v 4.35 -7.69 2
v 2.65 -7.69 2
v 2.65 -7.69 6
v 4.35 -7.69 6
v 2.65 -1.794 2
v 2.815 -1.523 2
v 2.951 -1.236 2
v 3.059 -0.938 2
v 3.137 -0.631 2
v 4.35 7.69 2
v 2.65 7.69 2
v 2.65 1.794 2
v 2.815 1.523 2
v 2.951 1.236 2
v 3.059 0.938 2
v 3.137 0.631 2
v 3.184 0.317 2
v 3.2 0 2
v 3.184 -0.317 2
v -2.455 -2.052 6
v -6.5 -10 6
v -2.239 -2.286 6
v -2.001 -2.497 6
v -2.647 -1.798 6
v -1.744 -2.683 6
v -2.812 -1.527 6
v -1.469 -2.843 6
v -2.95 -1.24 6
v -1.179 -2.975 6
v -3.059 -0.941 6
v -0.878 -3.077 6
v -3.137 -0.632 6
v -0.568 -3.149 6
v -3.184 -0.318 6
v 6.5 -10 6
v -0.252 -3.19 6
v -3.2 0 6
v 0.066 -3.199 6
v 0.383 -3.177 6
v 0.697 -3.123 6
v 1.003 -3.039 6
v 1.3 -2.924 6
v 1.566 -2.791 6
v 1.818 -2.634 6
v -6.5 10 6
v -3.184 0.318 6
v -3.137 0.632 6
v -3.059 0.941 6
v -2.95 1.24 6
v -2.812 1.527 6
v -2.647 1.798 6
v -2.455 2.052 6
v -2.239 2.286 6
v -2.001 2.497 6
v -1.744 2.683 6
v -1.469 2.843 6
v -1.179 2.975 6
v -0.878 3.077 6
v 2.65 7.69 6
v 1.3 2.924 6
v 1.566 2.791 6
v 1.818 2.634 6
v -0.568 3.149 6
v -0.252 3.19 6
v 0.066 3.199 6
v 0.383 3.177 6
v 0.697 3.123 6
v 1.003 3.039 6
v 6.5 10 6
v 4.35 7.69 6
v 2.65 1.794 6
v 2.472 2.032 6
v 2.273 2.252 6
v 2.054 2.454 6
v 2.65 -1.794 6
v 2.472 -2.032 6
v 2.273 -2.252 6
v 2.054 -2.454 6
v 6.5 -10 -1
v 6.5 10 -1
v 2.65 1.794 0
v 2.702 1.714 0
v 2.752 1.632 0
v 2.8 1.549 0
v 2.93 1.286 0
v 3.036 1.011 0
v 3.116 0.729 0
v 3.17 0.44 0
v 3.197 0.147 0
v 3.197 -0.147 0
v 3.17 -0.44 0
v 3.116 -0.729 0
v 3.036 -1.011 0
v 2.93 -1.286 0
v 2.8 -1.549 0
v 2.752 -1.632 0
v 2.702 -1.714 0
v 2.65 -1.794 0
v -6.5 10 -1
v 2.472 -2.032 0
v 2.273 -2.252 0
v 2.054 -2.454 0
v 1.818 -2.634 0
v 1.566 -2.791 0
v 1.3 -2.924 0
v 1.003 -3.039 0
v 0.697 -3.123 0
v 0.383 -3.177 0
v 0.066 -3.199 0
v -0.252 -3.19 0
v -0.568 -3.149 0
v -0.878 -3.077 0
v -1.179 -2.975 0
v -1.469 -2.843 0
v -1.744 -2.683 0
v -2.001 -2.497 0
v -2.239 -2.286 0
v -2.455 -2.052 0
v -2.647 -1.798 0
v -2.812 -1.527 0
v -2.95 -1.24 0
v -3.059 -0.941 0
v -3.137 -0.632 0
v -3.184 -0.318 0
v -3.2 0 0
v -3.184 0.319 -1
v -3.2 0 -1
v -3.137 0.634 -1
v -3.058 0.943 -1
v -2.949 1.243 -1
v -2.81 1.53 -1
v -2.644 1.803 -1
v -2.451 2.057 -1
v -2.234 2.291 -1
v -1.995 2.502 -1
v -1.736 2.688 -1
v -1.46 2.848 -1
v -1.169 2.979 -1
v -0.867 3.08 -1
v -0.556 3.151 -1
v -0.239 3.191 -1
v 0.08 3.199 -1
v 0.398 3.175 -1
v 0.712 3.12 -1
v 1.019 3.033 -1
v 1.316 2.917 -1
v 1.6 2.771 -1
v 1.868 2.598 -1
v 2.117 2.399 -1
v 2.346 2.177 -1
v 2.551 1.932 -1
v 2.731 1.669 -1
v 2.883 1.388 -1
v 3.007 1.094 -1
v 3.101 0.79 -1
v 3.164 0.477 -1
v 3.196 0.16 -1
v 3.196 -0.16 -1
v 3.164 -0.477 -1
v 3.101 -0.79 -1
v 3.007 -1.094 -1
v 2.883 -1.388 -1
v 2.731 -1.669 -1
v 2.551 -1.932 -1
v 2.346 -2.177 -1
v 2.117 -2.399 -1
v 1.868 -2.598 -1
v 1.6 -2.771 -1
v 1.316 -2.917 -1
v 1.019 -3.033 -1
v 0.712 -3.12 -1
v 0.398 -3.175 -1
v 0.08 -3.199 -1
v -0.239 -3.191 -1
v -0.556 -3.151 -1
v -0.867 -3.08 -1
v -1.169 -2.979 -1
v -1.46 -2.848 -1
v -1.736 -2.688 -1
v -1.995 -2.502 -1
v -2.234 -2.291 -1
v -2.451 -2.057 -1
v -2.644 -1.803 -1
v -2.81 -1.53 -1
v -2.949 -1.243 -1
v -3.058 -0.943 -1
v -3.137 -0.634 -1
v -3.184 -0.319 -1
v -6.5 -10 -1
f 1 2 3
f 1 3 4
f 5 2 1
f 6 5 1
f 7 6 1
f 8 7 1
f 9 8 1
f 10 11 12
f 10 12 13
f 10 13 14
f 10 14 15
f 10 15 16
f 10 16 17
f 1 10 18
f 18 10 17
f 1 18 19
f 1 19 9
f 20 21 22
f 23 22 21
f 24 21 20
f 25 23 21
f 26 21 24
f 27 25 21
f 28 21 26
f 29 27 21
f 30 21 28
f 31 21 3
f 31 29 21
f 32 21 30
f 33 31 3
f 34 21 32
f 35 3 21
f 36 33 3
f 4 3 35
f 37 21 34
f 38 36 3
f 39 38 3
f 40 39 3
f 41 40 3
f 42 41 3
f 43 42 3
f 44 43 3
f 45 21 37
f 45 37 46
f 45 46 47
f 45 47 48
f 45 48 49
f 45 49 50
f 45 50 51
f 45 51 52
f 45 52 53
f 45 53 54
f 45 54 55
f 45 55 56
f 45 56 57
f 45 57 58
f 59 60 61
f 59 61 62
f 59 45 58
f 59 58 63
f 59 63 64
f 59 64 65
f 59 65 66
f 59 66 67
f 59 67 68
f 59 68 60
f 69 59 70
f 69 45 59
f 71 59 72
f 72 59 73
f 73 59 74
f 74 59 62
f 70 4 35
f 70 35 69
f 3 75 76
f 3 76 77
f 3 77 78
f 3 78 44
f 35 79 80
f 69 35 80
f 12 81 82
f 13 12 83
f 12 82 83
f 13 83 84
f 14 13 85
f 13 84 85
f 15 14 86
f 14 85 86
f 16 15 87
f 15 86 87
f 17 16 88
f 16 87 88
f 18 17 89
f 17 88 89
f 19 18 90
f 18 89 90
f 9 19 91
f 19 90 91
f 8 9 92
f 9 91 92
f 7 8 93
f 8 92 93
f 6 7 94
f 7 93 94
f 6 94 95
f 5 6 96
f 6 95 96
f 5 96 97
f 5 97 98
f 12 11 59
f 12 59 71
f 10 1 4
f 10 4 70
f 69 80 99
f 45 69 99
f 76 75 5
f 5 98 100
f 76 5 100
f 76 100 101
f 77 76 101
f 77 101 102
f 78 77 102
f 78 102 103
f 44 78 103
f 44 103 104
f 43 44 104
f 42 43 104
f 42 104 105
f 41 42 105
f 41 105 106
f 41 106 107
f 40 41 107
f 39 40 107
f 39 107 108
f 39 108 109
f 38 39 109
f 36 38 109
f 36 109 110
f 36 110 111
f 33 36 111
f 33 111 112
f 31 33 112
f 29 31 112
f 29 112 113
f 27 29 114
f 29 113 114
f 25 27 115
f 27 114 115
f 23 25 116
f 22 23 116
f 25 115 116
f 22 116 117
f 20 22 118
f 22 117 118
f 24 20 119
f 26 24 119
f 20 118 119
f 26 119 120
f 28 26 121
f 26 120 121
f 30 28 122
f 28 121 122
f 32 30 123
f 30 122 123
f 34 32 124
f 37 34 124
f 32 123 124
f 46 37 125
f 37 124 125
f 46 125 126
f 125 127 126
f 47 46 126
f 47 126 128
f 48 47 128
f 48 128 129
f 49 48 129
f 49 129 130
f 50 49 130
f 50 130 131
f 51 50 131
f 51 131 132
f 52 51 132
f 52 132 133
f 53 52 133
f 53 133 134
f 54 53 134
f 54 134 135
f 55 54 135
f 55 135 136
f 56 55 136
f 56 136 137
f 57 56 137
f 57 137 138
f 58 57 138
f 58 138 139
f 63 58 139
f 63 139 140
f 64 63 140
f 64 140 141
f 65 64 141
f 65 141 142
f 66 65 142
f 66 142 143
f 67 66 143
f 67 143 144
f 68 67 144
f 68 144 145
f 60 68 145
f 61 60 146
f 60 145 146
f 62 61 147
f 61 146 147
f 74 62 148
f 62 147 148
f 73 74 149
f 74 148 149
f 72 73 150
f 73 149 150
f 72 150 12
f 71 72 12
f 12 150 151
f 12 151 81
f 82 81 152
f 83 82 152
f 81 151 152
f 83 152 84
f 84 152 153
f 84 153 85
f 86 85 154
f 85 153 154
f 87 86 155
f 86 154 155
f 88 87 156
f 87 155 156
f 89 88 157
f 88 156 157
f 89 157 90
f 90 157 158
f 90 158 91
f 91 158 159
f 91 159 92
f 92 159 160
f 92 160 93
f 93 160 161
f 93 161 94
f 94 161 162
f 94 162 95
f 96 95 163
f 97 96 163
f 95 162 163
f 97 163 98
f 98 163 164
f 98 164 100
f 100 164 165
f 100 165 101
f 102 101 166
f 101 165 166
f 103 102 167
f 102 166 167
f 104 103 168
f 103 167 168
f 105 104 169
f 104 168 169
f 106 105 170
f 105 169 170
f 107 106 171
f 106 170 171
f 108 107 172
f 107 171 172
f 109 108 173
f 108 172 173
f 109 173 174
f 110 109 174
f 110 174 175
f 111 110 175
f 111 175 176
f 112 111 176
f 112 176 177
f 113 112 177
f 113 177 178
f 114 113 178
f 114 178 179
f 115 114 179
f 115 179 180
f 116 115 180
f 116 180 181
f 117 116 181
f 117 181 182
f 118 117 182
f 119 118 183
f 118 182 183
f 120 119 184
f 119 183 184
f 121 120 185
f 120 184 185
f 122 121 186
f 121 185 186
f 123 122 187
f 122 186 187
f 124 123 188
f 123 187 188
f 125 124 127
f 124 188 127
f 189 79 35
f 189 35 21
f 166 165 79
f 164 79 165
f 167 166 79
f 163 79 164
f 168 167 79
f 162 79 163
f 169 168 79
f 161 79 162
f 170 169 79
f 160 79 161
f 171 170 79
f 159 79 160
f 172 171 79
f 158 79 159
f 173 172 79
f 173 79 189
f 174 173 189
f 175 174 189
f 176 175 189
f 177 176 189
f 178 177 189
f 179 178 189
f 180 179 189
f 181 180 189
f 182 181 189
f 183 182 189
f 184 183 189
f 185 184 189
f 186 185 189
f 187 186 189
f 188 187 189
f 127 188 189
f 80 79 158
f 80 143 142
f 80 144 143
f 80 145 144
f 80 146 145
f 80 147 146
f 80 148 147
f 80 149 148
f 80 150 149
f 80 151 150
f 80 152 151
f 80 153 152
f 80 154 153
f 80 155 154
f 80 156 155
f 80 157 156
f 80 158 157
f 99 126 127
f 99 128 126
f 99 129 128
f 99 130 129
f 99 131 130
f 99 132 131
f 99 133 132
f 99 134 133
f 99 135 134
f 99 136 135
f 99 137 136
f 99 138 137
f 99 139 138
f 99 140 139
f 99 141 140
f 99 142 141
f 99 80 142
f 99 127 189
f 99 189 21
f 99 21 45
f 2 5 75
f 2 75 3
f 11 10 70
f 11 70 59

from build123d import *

# Parameters (mm, degrees)
SKETCH2_W           = 13
SKETCH2_H           = 20
BOSS_EXTRUDE1_DEPTH = 6
BOSS_EXTRUDE2_DEPTH = 2
BOSS_EXTRUDE3_START = 1
SKETCH3_W           = 13
SKETCH3_H           = 20
SKETCH3_R           = 3.2
BOSS_EXTRUDE3_DEPTH = 1
BOSS_EXTRUDE4_DEPTH = 4
CUT_EXTRUDE1_START  = -6
CUT_EXTRUDE1_DEPTH  = 6
BOSS_EXTRUDE5_DEPTH = 2


# Read off the part's stored shape, not the designer's step: Cut-Extrude1
with BuildPart() as part:
    # Sketch2 → Boss-Extrude1 (new body)
    with BuildSketch(Plane.XY):
        Rectangle(SKETCH2_W, SKETCH2_H)
        with BuildLine():
            Line((1.3, -9.04), (1.3, -2.924038303))
            ThreePointArc((1.3, -2.924038303), (-3.2, 0), (1.3, 2.924038303))
            Line((1.3, 2.924038303), (1.3, 9.04))
            Line((1.3, 9.04), (5.7, 9.04))
            Line((5.7, 9.04), (5.7, -9.04))
            Line((5.7, -9.04), (1.3, -9.04))
        make_face(mode=Mode.SUBTRACT)
    extrude(amount=BOSS_EXTRUDE1_DEPTH)

    # Sketch2<3> → Boss-Extrude2 (add)
    with BuildSketch(Plane.XY):
        with BuildLine():
            Line((4.2, 7.54), (4.2, -7.54))
            Line((4.2, -7.54), (2.8, -7.54))
            Line((2.8, -7.54), (2.8, -1.549193338))
            ThreePointArc((2.8, -1.549193338), (2.162186317, -2.359014695), (1.3, -2.924038303))
            Line((1.3, -2.924038303), (1.3, -9.04))
            Line((1.3, -9.04), (5.7, -9.04))
            Line((5.7, -9.04), (5.7, 9.04))
            Line((5.7, 9.04), (1.3, 9.04))
            Line((1.3, 9.04), (1.3, 2.924038303))
            ThreePointArc((1.3, 2.924038303), (2.162186317, 2.359014695), (2.8, 1.549193338))
            Line((2.8, 1.549193338), (2.8, 7.54))
            Line((2.8, 7.54), (4.2, 7.54))
        make_face()
    extrude(amount=BOSS_EXTRUDE2_DEPTH)

    # Sketch3 → Boss-Extrude3 (add)
    with BuildSketch(Plane(origin=(0, 0, 0), x_dir=(-1, 0, 0), z_dir=(0, 0, -1)).offset(BOSS_EXTRUDE3_START)):
        Rectangle(SKETCH3_W, SKETCH3_H)
        Circle(SKETCH3_R, mode=Mode.SUBTRACT)
    extrude(amount=-BOSS_EXTRUDE3_DEPTH)

    # Sketch4 → Boss-Extrude4 (add)
    with BuildSketch(Plane.XY.offset(2)):
        with BuildLine():
            Line((2.8, 1.549193338), (2.8, 7.54))
            Line((2.8, 7.54), (4.2, 7.54))
            Line((4.2, 7.54), (4.2, -7.54))
            Line((4.2, -7.54), (2.8, -7.54))
            Line((2.8, -7.54), (2.8, -1.549193338))
            ThreePointArc((2.8, -1.549193338), (2.162186317, -2.359014695), (1.3, -2.924038303))
            Line((1.3, -2.924038303), (1.3, -9.04))
            Line((1.3, -9.04), (5.7, -9.04))
            Line((5.7, -9.04), (5.7, 9.04))
            Line((5.7, 9.04), (1.3, 9.04))
            Line((1.3, 9.04), (1.3, 2.924038303))
            ThreePointArc((1.3, 2.924038303), (2.162186317, 2.359014695), (2.8, 1.549193338))
        make_face()
    extrude(amount=BOSS_EXTRUDE4_DEPTH)

    # Cut-Extrude1 outline → Cut-Extrude1 (cut)
    with BuildSketch(Plane.XY.offset(6).offset(CUT_EXTRUDE1_START)):
        with BuildLine():
            Line((4.35, 7.69), (2.65, 7.69))
            Line((2.65, 7.69), (2.65, 1.793739111))
            ThreePointArc((2.65, 1.793739111), (2.727741861, 1.673148033), (2.8, 1.549193338))
            Line((2.8, 1.549193338), (2.8, 7.54))
            Line((2.8, 7.54), (4.2, 7.54))
            Line((4.2, 7.54), (4.2, -7.54))
            Line((4.2, -7.54), (2.8, -7.54))
            Line((2.8, -7.54), (2.8, -1.549193338))
            ThreePointArc((2.8, -1.549193338), (2.727741861, -1.673148033), (2.65, -1.793739111))
            Line((2.65, -1.793739111), (2.65, -7.69))
            Line((2.65, -7.69), (4.35, -7.69))
            Line((4.35, -7.69), (4.35, 7.69))
        make_face()
    extrude(amount=CUT_EXTRUDE1_DEPTH, mode=Mode.SUBTRACT)

    # Sketch7 → Boss-Extrude5 (add)
    with BuildSketch(Plane.XY):
        with BuildLine():
            Line((2.65, 7.69), (2.65, 1.793739111))
            ThreePointArc((2.65, 1.793739111), (3.2, 0), (2.65, -1.793739111))
            Line((2.65, -1.793739111), (2.65, -7.69))
            Line((2.65, -7.69), (4.35, -7.69))
            Line((4.35, -7.69), (4.35, 7.69))
            Line((4.35, 7.69), (2.65, 7.69))
        make_face()
    extrude(amount=BOSS_EXTRUDE5_DEPTH)


solid = part.part
